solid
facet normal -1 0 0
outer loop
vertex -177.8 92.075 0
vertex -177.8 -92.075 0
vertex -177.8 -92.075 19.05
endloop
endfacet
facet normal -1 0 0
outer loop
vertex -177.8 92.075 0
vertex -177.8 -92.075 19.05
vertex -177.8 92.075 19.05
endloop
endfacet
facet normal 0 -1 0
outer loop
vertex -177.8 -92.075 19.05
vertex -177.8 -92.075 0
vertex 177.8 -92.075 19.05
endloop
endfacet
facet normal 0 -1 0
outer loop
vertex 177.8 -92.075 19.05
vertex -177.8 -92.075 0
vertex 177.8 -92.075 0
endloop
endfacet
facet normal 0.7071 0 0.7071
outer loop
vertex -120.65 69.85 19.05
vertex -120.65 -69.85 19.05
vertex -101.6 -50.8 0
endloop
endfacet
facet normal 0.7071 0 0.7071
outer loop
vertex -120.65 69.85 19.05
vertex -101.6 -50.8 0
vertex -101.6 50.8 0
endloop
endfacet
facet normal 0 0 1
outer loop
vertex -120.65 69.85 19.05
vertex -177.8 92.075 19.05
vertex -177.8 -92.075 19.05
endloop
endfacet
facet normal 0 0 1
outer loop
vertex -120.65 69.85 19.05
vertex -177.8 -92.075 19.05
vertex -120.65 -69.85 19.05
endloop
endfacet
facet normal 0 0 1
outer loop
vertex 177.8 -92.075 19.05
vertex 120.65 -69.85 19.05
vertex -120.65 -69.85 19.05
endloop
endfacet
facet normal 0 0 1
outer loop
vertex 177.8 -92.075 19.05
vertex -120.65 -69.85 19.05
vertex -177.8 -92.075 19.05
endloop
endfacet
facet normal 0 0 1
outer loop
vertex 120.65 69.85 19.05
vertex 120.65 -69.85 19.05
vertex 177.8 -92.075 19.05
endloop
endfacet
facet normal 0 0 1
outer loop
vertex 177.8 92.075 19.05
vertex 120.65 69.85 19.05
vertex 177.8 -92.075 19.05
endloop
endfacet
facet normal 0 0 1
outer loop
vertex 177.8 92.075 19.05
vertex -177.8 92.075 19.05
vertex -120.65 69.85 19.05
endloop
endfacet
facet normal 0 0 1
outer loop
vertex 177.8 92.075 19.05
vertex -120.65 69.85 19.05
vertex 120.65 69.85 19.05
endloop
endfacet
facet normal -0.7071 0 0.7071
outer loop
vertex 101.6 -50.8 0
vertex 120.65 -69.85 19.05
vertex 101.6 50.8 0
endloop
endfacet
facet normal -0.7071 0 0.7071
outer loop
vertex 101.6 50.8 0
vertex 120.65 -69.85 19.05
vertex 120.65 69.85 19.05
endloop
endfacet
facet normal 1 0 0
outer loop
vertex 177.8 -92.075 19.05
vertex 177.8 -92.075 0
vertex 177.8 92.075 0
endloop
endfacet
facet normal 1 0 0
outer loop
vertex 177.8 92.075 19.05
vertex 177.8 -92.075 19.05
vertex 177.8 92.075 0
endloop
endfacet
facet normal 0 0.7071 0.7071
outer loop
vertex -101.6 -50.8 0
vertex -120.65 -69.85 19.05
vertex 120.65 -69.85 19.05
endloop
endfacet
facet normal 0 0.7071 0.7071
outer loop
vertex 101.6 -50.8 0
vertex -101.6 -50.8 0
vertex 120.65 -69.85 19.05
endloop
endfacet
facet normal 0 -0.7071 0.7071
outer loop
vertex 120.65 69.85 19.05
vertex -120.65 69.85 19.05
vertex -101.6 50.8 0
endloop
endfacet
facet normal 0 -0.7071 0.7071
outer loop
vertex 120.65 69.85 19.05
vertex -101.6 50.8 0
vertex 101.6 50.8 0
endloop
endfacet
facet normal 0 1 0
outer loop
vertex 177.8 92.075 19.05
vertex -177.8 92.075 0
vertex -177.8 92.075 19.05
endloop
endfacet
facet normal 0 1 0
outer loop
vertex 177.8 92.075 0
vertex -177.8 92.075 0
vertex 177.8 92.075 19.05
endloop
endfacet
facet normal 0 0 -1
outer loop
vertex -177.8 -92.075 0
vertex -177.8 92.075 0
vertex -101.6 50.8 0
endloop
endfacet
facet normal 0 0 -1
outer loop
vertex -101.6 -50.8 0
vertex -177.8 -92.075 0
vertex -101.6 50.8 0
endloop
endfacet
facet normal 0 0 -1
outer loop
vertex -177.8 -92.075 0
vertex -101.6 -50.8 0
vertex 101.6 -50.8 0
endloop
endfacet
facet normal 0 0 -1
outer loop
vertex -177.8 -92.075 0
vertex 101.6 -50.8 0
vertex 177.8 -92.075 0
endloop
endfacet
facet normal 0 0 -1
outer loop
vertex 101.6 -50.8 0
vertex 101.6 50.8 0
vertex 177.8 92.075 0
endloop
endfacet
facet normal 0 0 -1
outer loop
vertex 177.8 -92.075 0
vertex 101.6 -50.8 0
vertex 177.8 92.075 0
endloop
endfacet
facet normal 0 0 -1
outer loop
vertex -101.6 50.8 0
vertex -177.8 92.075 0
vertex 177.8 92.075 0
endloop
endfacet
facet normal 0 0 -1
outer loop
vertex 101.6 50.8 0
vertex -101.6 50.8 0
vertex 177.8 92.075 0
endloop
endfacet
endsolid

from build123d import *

# Parameters (mm, degrees)
F0_W     = 355.6
F0_H     = 184.15
F0_W_2   = 203.2
F0_H_2   = 101.6
F1_DEPTH = 19.05
F2_SIZE2 = 19.04999
F2_SIZE  = 19.04999


# Not quite as in the source:
# - a fillet or chamfer is up to 0.001 mm smaller than in the source, because OpenCascade refuses the exact size


with BuildPart() as f1:
    # F0 (on Top) → F1 (new body)
    with BuildSketch(Plane.XY):
        Rectangle(F0_W, F0_H)
        Rectangle(F0_W_2, F0_H_2, mode=Mode.SUBTRACT)
    extrude(amount=F1_DEPTH)

    # F2 (size 19.05 and 19.05 in the source; OpenCascade refuses exactly that, so slightly less here)
    f2_edges = [f1.edges().sort_by_distance(p)[0] for p in [
        (-101.6, 0, 19.05),
        (0, 50.8, 19.05),
        (101.6, 0, 19.05),
        (0, -50.8, 19.05),
    ]]
    chamfer(f2_edges, length=F2_SIZE, length2=F2_SIZE2)


solid = f1.part
